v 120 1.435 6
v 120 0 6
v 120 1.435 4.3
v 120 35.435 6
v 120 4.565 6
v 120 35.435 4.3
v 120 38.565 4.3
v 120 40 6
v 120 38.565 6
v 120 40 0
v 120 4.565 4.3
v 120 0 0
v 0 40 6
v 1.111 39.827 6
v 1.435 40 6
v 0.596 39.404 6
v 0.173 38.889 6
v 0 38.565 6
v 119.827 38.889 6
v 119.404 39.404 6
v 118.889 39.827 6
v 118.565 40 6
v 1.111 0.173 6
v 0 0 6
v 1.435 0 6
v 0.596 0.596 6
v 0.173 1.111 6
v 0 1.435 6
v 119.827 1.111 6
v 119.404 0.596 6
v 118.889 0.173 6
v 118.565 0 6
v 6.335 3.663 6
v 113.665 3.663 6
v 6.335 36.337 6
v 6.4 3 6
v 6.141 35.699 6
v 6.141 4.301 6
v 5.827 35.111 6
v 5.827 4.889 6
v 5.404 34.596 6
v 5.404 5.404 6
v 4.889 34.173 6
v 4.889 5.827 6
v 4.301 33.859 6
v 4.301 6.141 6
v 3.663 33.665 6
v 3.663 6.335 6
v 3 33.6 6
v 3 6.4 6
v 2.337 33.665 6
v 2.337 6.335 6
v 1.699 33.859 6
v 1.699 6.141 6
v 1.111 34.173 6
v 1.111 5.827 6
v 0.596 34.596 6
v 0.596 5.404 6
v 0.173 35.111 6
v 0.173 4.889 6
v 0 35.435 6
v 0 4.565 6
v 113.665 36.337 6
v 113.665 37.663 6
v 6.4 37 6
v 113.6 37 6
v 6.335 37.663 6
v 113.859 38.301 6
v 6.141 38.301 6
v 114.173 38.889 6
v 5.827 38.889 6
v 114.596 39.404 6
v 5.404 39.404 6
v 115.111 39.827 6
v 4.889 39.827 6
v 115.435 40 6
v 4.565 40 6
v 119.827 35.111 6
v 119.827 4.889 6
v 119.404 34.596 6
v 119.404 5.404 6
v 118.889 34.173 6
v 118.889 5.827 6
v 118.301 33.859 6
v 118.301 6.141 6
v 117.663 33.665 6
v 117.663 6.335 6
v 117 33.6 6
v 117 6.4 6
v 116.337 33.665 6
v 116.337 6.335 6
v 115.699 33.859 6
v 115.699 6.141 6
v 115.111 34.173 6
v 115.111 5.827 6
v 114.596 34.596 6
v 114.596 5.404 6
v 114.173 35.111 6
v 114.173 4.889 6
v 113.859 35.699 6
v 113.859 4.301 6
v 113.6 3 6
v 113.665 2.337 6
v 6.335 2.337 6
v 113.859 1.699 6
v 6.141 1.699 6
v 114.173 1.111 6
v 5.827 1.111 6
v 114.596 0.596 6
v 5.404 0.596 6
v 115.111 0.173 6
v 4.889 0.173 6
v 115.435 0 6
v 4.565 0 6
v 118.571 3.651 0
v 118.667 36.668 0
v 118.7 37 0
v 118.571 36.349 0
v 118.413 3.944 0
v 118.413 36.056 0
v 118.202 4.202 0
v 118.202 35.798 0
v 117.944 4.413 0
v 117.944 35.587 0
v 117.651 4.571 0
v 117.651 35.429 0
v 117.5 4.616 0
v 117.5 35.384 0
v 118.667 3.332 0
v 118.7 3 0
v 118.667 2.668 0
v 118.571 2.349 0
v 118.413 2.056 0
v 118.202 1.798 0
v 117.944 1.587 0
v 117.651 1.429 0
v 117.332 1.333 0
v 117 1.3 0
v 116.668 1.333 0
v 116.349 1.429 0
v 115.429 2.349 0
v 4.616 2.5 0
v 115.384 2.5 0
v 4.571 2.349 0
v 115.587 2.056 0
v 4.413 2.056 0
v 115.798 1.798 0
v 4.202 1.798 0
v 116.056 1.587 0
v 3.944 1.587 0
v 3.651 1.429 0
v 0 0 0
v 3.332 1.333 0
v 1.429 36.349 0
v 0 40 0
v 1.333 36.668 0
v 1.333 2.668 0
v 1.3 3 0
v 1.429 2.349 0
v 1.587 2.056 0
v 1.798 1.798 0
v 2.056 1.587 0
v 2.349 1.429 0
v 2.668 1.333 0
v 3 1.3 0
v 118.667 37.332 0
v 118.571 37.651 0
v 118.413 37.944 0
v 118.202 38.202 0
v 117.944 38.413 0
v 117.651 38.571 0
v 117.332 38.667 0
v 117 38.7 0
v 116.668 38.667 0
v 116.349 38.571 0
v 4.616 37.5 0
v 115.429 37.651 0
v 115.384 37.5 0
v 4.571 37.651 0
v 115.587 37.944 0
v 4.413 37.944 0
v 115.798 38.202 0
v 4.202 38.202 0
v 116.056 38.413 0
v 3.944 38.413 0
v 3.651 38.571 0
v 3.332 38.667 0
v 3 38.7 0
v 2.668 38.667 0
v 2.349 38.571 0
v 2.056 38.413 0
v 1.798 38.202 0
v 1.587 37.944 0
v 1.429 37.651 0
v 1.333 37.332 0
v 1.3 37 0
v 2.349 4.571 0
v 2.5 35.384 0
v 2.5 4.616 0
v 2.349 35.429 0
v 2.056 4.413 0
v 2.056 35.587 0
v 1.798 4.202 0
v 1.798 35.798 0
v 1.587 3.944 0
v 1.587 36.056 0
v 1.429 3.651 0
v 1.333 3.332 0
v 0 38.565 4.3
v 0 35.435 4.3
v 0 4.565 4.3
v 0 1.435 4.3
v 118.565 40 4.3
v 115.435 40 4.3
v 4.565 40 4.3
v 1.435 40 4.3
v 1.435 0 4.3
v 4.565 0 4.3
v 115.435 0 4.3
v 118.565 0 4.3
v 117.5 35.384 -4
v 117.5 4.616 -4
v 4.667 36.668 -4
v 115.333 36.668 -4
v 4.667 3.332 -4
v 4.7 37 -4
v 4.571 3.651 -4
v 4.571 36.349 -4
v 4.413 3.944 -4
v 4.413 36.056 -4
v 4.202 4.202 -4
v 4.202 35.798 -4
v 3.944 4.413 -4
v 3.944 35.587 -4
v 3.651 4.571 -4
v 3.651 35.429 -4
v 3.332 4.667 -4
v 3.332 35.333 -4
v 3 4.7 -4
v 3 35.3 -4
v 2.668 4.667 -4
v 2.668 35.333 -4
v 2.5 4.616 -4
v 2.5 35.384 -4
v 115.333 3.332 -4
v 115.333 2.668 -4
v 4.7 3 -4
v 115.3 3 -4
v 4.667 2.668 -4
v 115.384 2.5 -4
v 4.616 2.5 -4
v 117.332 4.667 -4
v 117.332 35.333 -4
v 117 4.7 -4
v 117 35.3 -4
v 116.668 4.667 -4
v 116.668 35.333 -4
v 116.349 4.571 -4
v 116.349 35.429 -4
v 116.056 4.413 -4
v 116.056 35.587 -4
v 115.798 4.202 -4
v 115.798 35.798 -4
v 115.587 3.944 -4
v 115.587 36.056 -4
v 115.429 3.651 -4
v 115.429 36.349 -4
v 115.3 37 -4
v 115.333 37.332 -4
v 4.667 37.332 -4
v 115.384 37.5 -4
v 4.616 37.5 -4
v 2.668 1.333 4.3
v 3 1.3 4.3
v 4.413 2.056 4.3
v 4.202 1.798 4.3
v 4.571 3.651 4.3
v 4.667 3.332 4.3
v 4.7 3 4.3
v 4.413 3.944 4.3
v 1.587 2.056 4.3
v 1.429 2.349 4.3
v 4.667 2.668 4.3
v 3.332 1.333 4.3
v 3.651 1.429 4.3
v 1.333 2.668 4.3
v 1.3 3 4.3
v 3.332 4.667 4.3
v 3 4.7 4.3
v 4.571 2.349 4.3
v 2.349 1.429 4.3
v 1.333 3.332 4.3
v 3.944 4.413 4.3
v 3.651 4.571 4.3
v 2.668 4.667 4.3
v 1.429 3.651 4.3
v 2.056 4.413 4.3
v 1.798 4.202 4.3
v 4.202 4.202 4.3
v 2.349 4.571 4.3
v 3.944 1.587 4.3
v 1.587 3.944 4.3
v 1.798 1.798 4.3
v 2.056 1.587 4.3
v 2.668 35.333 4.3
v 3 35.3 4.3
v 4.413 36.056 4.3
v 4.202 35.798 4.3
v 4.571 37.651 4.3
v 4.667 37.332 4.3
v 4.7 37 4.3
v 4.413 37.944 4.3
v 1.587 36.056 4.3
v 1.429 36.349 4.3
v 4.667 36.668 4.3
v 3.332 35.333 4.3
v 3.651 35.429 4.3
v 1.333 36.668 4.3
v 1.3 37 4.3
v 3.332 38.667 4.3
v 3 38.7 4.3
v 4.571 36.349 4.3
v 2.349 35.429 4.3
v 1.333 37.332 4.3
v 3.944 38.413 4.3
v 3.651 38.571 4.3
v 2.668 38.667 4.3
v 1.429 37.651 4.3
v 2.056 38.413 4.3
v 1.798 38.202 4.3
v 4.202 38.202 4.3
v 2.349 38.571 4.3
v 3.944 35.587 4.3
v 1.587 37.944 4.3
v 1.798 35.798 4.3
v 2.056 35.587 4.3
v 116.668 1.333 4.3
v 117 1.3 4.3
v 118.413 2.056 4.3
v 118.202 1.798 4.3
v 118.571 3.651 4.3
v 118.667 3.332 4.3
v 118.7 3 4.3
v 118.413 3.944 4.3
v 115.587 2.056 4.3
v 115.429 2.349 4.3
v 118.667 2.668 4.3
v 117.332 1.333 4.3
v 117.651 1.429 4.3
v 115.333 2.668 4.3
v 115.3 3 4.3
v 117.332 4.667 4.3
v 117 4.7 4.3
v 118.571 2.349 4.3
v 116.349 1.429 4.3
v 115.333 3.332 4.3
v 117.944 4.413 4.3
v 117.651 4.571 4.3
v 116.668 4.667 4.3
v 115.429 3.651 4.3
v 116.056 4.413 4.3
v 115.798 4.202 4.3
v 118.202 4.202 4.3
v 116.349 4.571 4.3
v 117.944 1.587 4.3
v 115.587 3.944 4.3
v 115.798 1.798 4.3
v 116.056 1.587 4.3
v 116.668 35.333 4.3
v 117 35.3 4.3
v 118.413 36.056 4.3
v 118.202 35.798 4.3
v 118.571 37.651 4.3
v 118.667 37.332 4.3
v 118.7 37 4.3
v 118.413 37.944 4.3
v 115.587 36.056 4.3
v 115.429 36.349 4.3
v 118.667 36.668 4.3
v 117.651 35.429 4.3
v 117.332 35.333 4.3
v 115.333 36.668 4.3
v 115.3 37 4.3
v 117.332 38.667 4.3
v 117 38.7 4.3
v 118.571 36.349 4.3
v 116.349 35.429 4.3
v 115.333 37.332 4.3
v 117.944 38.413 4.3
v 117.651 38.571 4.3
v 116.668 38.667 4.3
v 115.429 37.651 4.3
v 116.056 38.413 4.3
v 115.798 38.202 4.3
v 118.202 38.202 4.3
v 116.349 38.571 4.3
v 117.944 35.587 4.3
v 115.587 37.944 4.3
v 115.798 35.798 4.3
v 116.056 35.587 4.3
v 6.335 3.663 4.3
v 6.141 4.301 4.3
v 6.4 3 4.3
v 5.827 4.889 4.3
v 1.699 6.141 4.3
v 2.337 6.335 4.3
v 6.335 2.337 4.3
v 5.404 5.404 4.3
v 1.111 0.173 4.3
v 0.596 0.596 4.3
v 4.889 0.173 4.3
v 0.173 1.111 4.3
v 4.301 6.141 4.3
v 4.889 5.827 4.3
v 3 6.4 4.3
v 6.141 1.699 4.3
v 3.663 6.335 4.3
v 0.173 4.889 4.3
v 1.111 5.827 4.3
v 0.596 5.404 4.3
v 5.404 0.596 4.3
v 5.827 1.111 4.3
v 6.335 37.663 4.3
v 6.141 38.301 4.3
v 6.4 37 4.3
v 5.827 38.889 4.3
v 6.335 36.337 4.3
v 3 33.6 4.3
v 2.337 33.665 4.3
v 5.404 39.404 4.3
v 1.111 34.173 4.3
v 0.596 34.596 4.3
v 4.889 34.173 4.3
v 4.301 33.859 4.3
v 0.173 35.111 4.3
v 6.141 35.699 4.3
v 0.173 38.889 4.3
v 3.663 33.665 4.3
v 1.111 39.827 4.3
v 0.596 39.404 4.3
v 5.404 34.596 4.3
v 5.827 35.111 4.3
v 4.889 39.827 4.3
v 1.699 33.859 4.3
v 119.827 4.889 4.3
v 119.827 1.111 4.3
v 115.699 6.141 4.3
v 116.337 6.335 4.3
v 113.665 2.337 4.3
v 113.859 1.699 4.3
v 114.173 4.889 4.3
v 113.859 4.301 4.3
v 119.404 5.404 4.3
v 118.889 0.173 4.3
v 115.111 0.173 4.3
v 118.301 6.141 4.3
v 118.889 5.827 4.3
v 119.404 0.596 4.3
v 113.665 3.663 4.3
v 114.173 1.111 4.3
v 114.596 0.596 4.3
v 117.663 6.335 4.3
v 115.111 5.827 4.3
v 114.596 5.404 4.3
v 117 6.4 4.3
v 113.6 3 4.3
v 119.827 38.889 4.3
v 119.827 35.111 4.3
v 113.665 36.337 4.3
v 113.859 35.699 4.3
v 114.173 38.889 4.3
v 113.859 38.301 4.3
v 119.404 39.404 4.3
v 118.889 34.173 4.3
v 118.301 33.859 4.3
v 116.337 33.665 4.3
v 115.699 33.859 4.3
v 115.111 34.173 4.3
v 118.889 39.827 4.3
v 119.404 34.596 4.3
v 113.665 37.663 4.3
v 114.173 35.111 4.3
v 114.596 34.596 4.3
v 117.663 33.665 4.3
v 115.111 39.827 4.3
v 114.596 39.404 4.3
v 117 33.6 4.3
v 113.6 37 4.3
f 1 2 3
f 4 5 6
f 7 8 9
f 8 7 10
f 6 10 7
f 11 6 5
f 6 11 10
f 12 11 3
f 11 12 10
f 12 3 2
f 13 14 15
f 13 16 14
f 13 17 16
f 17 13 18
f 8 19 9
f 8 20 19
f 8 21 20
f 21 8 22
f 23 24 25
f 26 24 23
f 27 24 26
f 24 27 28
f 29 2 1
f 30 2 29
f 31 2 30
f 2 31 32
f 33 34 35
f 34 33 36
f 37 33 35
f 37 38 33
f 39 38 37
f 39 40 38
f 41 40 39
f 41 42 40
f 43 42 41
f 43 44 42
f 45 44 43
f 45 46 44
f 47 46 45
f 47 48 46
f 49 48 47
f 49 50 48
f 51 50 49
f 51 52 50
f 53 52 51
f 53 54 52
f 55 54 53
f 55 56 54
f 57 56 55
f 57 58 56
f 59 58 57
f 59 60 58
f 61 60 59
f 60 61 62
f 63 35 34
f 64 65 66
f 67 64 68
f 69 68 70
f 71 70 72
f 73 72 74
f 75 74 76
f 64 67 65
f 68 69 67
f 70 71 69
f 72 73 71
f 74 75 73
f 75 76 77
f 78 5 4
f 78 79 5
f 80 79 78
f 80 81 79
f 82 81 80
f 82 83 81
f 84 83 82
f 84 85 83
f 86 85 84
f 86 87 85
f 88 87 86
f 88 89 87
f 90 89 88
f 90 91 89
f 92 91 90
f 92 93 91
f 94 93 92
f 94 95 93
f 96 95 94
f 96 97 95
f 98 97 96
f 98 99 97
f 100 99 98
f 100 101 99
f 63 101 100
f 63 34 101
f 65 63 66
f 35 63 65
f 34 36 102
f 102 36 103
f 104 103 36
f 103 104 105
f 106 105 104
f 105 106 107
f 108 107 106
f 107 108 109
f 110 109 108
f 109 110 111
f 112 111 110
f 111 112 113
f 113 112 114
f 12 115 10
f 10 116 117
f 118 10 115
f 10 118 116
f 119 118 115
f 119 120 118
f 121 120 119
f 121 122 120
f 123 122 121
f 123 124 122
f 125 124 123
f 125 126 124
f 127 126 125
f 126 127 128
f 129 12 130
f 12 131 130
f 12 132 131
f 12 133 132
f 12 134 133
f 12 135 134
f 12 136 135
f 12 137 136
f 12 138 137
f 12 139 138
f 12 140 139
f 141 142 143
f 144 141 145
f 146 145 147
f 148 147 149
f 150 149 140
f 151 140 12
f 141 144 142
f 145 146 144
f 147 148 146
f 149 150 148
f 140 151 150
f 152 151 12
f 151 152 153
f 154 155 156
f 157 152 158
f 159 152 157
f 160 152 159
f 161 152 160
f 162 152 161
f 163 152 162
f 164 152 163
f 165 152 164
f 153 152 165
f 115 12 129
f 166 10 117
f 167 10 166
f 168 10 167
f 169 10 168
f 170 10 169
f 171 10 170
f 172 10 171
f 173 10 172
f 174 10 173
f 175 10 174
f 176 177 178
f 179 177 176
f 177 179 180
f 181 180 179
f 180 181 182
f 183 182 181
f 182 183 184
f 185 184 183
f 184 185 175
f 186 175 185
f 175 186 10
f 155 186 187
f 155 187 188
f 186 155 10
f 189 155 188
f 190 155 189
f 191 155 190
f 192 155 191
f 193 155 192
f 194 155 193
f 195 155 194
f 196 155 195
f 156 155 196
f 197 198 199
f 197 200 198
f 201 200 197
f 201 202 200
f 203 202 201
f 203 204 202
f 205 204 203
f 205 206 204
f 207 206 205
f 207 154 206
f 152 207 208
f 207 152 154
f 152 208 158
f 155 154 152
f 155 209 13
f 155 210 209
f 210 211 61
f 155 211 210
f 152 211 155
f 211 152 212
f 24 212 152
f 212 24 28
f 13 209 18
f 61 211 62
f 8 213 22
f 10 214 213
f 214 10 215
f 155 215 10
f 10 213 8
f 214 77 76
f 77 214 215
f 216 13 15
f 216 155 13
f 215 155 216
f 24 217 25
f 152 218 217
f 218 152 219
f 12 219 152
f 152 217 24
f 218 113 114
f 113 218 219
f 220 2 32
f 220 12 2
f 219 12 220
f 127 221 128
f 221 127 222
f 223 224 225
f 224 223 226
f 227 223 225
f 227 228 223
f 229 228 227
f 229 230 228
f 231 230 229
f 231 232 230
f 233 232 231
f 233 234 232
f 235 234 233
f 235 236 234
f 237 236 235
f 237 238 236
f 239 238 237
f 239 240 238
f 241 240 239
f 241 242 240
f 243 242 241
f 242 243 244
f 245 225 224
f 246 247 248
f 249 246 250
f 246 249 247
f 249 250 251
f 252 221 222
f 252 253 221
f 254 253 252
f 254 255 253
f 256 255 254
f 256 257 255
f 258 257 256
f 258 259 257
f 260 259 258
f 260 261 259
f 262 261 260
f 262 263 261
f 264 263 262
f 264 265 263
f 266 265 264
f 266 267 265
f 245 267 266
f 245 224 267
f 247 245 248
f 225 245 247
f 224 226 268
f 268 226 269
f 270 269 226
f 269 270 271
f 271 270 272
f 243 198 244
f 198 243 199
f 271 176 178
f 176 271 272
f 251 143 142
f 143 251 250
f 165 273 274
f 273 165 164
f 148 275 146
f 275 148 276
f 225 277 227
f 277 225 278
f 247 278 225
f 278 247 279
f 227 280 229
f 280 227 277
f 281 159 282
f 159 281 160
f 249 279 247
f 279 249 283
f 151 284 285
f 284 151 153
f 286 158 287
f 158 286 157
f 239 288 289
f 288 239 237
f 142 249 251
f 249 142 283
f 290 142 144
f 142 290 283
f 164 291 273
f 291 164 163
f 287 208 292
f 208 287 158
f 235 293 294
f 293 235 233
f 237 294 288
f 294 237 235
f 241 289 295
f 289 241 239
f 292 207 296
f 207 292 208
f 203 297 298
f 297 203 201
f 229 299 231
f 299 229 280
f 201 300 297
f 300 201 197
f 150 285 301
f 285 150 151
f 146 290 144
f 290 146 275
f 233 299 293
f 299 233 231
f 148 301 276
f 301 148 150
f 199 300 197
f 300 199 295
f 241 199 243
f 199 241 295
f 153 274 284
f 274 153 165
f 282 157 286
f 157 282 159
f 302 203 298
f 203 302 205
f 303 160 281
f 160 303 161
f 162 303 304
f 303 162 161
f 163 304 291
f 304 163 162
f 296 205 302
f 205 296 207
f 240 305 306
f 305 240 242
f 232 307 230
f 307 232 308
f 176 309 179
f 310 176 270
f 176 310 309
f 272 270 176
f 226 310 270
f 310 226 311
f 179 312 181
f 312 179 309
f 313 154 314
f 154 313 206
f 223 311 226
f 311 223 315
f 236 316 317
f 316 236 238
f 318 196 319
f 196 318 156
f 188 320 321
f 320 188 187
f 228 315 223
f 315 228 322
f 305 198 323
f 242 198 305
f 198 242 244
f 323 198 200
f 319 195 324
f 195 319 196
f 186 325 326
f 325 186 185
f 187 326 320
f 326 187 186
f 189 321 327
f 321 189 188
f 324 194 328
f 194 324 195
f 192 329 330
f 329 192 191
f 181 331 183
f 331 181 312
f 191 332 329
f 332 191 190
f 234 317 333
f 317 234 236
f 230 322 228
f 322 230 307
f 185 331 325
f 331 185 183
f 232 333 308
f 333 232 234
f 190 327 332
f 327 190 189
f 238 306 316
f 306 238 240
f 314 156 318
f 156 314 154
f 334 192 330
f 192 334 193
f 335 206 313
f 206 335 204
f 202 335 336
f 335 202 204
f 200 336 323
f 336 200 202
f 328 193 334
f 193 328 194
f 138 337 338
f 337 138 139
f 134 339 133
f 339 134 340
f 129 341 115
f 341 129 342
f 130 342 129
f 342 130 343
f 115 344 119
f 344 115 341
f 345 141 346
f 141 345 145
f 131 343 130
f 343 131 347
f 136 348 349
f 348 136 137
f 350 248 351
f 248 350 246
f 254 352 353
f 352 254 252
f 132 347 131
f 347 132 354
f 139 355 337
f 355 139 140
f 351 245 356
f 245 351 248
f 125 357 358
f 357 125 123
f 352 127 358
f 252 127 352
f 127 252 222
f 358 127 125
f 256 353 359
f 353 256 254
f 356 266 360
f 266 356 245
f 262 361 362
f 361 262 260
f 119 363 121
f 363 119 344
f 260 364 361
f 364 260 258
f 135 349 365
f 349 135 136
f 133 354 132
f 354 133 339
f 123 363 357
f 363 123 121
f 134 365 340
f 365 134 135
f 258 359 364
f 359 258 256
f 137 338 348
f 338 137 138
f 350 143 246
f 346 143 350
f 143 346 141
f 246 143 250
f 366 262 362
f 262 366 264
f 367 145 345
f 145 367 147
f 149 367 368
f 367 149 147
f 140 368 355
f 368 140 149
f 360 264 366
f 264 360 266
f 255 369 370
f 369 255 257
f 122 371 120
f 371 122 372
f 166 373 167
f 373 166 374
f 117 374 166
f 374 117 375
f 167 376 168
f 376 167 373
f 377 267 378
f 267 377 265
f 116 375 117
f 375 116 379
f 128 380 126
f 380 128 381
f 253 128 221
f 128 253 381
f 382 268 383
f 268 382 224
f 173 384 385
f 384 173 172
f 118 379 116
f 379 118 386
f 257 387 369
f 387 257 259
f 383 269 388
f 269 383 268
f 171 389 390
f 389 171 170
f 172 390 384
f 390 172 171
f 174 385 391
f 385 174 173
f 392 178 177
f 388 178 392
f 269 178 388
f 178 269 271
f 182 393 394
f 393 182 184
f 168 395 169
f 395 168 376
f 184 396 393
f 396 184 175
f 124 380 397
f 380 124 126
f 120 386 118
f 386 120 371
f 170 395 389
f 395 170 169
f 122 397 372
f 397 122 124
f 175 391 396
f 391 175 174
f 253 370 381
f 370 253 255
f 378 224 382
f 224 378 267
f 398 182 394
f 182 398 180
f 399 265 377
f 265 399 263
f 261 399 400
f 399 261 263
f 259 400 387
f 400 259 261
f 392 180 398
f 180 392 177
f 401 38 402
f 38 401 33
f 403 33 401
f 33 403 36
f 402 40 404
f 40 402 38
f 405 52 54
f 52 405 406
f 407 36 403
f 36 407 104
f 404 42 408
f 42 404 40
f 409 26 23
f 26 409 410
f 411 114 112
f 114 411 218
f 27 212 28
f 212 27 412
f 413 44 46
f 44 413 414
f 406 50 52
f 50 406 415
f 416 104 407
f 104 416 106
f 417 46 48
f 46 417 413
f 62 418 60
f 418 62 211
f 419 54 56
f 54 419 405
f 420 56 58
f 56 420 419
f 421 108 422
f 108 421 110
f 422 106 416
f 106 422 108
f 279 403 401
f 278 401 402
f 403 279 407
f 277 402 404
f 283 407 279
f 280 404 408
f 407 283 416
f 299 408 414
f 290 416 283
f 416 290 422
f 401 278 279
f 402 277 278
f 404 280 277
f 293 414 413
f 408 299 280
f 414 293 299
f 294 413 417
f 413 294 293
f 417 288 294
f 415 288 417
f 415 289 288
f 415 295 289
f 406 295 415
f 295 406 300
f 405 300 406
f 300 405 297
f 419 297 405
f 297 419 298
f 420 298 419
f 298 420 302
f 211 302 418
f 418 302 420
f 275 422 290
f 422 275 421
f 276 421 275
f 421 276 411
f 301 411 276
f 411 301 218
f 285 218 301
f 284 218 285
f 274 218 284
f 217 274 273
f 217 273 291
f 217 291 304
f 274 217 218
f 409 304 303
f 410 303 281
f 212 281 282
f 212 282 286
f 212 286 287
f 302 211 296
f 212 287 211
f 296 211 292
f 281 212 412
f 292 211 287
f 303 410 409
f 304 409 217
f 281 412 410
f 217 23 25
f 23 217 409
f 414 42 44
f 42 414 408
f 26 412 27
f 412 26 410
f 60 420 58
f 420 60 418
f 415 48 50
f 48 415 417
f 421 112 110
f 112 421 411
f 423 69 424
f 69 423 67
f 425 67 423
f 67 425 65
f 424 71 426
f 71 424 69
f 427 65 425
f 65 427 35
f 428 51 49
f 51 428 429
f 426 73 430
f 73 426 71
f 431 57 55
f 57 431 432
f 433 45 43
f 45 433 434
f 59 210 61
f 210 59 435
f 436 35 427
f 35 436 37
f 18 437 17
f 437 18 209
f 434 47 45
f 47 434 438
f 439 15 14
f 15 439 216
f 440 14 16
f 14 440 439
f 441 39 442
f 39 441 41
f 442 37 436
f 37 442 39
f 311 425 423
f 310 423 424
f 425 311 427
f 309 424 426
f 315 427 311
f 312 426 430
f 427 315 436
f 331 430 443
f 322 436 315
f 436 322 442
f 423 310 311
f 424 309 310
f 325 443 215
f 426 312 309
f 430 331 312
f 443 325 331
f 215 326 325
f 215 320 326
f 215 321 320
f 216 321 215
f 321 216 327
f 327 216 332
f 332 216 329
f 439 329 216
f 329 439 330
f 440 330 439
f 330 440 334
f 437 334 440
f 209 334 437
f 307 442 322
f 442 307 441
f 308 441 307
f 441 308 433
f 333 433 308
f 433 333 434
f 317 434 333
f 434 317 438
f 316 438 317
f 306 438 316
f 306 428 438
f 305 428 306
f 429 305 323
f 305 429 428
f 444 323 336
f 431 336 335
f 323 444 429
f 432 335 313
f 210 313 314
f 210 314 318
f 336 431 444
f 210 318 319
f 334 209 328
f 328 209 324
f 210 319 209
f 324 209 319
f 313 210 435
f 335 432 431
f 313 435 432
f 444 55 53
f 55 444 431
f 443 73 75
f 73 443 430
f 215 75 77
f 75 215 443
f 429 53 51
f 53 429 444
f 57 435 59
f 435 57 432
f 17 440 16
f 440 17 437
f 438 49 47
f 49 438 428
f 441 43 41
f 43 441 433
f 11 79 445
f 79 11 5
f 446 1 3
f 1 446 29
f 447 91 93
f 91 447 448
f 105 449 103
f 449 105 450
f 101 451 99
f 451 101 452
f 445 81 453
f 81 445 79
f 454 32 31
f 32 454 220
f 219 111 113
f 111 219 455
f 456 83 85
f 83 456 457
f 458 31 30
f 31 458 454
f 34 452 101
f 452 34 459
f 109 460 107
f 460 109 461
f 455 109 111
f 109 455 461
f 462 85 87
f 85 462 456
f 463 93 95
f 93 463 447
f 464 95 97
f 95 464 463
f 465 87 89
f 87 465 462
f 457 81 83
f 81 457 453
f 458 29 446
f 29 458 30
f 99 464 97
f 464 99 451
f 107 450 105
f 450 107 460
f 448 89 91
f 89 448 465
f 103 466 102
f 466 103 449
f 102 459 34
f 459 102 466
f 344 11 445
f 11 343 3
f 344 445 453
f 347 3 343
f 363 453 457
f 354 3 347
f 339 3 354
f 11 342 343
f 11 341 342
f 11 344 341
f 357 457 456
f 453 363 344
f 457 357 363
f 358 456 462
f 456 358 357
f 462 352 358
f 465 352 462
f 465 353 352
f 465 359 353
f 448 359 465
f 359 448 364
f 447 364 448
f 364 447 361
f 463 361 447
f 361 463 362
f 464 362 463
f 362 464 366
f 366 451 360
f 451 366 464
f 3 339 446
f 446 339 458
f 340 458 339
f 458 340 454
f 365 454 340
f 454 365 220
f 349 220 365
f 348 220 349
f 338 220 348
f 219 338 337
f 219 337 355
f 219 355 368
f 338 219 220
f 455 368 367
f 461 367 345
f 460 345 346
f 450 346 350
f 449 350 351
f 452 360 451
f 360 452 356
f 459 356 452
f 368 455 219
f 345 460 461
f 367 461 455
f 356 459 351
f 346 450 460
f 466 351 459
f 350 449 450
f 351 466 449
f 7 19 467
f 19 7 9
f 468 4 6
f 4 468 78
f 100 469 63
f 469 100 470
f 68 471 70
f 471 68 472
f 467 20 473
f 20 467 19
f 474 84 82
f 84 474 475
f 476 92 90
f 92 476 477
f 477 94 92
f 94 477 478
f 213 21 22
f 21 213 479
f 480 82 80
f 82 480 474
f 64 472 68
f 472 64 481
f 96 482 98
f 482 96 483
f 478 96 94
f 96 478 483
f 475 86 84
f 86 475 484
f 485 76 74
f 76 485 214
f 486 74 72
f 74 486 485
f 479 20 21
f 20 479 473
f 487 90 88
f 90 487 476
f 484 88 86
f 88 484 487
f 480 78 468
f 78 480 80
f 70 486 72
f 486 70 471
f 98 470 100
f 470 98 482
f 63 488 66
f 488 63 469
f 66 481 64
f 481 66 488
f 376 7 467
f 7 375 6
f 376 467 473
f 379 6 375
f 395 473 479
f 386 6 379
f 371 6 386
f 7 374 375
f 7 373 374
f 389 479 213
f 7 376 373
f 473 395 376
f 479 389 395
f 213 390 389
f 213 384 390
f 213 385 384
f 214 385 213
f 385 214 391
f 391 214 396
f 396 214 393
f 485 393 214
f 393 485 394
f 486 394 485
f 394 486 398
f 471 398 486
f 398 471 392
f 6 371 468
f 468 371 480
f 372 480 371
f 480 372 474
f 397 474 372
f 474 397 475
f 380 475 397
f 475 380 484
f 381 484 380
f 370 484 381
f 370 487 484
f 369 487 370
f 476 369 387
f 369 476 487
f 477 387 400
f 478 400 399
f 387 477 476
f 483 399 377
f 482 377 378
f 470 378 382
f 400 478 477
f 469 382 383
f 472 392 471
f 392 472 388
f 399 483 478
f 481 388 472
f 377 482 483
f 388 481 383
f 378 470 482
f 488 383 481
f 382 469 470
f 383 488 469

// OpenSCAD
$fn = 32;

// ----------------------------------------------------------------------
// Enclosure lid: 120 x 40 x 6 mm, 4 bolt holes
// ----------------------------------------------------------------------

// --- parameters (mm) ---
length = 120;             // lid length, X
width = 40;               // lid width, Y
plate_t = 6;              // lid plate thickness
bolt_d = 3.4;             // bolt clearance
boss_lip = 3;             // bolt hole inset from the corner
sink = 1;                 // overlap of the lip and ribs into the plate
lip_h = 5;                // lip height below the plate
lip_wall = 2.5;           // lip wall thickness
cs_d = 6.8;               // countersink diameter
cs_h = 1.7;               // countersink depth

module plate() {
  cube([length, width, plate_t]);
  /* lip that drops into the housing opening, sunk into the plate */
  translate([lip_wall, lip_wall, -lip_h + sink]) cube([length - 2 * lip_wall, width - 2 * lip_wall, lip_h]);
}

difference() {
  plate();
  /* bolt pattern matching the corner bosses */
  for (sx = [0, 1]) for (sy = [0, 1])
    translate([sx * (length - 2 * boss_lip) + boss_lip, sy * (width - 2 * boss_lip) + boss_lip, -lip_h - 1])
      cylinder(h = plate_t + lip_h + 2, d = bolt_d);
  /* countersinks so the heads sit flush */
  for (sx = [0, 1]) for (sy = [0, 1])
    translate([sx * (length - 2 * boss_lip) + boss_lip, sy * (width - 2 * boss_lip) + boss_lip, plate_t - cs_h])
      cylinder(h = cs_h + 0.5, d = cs_d);
}
